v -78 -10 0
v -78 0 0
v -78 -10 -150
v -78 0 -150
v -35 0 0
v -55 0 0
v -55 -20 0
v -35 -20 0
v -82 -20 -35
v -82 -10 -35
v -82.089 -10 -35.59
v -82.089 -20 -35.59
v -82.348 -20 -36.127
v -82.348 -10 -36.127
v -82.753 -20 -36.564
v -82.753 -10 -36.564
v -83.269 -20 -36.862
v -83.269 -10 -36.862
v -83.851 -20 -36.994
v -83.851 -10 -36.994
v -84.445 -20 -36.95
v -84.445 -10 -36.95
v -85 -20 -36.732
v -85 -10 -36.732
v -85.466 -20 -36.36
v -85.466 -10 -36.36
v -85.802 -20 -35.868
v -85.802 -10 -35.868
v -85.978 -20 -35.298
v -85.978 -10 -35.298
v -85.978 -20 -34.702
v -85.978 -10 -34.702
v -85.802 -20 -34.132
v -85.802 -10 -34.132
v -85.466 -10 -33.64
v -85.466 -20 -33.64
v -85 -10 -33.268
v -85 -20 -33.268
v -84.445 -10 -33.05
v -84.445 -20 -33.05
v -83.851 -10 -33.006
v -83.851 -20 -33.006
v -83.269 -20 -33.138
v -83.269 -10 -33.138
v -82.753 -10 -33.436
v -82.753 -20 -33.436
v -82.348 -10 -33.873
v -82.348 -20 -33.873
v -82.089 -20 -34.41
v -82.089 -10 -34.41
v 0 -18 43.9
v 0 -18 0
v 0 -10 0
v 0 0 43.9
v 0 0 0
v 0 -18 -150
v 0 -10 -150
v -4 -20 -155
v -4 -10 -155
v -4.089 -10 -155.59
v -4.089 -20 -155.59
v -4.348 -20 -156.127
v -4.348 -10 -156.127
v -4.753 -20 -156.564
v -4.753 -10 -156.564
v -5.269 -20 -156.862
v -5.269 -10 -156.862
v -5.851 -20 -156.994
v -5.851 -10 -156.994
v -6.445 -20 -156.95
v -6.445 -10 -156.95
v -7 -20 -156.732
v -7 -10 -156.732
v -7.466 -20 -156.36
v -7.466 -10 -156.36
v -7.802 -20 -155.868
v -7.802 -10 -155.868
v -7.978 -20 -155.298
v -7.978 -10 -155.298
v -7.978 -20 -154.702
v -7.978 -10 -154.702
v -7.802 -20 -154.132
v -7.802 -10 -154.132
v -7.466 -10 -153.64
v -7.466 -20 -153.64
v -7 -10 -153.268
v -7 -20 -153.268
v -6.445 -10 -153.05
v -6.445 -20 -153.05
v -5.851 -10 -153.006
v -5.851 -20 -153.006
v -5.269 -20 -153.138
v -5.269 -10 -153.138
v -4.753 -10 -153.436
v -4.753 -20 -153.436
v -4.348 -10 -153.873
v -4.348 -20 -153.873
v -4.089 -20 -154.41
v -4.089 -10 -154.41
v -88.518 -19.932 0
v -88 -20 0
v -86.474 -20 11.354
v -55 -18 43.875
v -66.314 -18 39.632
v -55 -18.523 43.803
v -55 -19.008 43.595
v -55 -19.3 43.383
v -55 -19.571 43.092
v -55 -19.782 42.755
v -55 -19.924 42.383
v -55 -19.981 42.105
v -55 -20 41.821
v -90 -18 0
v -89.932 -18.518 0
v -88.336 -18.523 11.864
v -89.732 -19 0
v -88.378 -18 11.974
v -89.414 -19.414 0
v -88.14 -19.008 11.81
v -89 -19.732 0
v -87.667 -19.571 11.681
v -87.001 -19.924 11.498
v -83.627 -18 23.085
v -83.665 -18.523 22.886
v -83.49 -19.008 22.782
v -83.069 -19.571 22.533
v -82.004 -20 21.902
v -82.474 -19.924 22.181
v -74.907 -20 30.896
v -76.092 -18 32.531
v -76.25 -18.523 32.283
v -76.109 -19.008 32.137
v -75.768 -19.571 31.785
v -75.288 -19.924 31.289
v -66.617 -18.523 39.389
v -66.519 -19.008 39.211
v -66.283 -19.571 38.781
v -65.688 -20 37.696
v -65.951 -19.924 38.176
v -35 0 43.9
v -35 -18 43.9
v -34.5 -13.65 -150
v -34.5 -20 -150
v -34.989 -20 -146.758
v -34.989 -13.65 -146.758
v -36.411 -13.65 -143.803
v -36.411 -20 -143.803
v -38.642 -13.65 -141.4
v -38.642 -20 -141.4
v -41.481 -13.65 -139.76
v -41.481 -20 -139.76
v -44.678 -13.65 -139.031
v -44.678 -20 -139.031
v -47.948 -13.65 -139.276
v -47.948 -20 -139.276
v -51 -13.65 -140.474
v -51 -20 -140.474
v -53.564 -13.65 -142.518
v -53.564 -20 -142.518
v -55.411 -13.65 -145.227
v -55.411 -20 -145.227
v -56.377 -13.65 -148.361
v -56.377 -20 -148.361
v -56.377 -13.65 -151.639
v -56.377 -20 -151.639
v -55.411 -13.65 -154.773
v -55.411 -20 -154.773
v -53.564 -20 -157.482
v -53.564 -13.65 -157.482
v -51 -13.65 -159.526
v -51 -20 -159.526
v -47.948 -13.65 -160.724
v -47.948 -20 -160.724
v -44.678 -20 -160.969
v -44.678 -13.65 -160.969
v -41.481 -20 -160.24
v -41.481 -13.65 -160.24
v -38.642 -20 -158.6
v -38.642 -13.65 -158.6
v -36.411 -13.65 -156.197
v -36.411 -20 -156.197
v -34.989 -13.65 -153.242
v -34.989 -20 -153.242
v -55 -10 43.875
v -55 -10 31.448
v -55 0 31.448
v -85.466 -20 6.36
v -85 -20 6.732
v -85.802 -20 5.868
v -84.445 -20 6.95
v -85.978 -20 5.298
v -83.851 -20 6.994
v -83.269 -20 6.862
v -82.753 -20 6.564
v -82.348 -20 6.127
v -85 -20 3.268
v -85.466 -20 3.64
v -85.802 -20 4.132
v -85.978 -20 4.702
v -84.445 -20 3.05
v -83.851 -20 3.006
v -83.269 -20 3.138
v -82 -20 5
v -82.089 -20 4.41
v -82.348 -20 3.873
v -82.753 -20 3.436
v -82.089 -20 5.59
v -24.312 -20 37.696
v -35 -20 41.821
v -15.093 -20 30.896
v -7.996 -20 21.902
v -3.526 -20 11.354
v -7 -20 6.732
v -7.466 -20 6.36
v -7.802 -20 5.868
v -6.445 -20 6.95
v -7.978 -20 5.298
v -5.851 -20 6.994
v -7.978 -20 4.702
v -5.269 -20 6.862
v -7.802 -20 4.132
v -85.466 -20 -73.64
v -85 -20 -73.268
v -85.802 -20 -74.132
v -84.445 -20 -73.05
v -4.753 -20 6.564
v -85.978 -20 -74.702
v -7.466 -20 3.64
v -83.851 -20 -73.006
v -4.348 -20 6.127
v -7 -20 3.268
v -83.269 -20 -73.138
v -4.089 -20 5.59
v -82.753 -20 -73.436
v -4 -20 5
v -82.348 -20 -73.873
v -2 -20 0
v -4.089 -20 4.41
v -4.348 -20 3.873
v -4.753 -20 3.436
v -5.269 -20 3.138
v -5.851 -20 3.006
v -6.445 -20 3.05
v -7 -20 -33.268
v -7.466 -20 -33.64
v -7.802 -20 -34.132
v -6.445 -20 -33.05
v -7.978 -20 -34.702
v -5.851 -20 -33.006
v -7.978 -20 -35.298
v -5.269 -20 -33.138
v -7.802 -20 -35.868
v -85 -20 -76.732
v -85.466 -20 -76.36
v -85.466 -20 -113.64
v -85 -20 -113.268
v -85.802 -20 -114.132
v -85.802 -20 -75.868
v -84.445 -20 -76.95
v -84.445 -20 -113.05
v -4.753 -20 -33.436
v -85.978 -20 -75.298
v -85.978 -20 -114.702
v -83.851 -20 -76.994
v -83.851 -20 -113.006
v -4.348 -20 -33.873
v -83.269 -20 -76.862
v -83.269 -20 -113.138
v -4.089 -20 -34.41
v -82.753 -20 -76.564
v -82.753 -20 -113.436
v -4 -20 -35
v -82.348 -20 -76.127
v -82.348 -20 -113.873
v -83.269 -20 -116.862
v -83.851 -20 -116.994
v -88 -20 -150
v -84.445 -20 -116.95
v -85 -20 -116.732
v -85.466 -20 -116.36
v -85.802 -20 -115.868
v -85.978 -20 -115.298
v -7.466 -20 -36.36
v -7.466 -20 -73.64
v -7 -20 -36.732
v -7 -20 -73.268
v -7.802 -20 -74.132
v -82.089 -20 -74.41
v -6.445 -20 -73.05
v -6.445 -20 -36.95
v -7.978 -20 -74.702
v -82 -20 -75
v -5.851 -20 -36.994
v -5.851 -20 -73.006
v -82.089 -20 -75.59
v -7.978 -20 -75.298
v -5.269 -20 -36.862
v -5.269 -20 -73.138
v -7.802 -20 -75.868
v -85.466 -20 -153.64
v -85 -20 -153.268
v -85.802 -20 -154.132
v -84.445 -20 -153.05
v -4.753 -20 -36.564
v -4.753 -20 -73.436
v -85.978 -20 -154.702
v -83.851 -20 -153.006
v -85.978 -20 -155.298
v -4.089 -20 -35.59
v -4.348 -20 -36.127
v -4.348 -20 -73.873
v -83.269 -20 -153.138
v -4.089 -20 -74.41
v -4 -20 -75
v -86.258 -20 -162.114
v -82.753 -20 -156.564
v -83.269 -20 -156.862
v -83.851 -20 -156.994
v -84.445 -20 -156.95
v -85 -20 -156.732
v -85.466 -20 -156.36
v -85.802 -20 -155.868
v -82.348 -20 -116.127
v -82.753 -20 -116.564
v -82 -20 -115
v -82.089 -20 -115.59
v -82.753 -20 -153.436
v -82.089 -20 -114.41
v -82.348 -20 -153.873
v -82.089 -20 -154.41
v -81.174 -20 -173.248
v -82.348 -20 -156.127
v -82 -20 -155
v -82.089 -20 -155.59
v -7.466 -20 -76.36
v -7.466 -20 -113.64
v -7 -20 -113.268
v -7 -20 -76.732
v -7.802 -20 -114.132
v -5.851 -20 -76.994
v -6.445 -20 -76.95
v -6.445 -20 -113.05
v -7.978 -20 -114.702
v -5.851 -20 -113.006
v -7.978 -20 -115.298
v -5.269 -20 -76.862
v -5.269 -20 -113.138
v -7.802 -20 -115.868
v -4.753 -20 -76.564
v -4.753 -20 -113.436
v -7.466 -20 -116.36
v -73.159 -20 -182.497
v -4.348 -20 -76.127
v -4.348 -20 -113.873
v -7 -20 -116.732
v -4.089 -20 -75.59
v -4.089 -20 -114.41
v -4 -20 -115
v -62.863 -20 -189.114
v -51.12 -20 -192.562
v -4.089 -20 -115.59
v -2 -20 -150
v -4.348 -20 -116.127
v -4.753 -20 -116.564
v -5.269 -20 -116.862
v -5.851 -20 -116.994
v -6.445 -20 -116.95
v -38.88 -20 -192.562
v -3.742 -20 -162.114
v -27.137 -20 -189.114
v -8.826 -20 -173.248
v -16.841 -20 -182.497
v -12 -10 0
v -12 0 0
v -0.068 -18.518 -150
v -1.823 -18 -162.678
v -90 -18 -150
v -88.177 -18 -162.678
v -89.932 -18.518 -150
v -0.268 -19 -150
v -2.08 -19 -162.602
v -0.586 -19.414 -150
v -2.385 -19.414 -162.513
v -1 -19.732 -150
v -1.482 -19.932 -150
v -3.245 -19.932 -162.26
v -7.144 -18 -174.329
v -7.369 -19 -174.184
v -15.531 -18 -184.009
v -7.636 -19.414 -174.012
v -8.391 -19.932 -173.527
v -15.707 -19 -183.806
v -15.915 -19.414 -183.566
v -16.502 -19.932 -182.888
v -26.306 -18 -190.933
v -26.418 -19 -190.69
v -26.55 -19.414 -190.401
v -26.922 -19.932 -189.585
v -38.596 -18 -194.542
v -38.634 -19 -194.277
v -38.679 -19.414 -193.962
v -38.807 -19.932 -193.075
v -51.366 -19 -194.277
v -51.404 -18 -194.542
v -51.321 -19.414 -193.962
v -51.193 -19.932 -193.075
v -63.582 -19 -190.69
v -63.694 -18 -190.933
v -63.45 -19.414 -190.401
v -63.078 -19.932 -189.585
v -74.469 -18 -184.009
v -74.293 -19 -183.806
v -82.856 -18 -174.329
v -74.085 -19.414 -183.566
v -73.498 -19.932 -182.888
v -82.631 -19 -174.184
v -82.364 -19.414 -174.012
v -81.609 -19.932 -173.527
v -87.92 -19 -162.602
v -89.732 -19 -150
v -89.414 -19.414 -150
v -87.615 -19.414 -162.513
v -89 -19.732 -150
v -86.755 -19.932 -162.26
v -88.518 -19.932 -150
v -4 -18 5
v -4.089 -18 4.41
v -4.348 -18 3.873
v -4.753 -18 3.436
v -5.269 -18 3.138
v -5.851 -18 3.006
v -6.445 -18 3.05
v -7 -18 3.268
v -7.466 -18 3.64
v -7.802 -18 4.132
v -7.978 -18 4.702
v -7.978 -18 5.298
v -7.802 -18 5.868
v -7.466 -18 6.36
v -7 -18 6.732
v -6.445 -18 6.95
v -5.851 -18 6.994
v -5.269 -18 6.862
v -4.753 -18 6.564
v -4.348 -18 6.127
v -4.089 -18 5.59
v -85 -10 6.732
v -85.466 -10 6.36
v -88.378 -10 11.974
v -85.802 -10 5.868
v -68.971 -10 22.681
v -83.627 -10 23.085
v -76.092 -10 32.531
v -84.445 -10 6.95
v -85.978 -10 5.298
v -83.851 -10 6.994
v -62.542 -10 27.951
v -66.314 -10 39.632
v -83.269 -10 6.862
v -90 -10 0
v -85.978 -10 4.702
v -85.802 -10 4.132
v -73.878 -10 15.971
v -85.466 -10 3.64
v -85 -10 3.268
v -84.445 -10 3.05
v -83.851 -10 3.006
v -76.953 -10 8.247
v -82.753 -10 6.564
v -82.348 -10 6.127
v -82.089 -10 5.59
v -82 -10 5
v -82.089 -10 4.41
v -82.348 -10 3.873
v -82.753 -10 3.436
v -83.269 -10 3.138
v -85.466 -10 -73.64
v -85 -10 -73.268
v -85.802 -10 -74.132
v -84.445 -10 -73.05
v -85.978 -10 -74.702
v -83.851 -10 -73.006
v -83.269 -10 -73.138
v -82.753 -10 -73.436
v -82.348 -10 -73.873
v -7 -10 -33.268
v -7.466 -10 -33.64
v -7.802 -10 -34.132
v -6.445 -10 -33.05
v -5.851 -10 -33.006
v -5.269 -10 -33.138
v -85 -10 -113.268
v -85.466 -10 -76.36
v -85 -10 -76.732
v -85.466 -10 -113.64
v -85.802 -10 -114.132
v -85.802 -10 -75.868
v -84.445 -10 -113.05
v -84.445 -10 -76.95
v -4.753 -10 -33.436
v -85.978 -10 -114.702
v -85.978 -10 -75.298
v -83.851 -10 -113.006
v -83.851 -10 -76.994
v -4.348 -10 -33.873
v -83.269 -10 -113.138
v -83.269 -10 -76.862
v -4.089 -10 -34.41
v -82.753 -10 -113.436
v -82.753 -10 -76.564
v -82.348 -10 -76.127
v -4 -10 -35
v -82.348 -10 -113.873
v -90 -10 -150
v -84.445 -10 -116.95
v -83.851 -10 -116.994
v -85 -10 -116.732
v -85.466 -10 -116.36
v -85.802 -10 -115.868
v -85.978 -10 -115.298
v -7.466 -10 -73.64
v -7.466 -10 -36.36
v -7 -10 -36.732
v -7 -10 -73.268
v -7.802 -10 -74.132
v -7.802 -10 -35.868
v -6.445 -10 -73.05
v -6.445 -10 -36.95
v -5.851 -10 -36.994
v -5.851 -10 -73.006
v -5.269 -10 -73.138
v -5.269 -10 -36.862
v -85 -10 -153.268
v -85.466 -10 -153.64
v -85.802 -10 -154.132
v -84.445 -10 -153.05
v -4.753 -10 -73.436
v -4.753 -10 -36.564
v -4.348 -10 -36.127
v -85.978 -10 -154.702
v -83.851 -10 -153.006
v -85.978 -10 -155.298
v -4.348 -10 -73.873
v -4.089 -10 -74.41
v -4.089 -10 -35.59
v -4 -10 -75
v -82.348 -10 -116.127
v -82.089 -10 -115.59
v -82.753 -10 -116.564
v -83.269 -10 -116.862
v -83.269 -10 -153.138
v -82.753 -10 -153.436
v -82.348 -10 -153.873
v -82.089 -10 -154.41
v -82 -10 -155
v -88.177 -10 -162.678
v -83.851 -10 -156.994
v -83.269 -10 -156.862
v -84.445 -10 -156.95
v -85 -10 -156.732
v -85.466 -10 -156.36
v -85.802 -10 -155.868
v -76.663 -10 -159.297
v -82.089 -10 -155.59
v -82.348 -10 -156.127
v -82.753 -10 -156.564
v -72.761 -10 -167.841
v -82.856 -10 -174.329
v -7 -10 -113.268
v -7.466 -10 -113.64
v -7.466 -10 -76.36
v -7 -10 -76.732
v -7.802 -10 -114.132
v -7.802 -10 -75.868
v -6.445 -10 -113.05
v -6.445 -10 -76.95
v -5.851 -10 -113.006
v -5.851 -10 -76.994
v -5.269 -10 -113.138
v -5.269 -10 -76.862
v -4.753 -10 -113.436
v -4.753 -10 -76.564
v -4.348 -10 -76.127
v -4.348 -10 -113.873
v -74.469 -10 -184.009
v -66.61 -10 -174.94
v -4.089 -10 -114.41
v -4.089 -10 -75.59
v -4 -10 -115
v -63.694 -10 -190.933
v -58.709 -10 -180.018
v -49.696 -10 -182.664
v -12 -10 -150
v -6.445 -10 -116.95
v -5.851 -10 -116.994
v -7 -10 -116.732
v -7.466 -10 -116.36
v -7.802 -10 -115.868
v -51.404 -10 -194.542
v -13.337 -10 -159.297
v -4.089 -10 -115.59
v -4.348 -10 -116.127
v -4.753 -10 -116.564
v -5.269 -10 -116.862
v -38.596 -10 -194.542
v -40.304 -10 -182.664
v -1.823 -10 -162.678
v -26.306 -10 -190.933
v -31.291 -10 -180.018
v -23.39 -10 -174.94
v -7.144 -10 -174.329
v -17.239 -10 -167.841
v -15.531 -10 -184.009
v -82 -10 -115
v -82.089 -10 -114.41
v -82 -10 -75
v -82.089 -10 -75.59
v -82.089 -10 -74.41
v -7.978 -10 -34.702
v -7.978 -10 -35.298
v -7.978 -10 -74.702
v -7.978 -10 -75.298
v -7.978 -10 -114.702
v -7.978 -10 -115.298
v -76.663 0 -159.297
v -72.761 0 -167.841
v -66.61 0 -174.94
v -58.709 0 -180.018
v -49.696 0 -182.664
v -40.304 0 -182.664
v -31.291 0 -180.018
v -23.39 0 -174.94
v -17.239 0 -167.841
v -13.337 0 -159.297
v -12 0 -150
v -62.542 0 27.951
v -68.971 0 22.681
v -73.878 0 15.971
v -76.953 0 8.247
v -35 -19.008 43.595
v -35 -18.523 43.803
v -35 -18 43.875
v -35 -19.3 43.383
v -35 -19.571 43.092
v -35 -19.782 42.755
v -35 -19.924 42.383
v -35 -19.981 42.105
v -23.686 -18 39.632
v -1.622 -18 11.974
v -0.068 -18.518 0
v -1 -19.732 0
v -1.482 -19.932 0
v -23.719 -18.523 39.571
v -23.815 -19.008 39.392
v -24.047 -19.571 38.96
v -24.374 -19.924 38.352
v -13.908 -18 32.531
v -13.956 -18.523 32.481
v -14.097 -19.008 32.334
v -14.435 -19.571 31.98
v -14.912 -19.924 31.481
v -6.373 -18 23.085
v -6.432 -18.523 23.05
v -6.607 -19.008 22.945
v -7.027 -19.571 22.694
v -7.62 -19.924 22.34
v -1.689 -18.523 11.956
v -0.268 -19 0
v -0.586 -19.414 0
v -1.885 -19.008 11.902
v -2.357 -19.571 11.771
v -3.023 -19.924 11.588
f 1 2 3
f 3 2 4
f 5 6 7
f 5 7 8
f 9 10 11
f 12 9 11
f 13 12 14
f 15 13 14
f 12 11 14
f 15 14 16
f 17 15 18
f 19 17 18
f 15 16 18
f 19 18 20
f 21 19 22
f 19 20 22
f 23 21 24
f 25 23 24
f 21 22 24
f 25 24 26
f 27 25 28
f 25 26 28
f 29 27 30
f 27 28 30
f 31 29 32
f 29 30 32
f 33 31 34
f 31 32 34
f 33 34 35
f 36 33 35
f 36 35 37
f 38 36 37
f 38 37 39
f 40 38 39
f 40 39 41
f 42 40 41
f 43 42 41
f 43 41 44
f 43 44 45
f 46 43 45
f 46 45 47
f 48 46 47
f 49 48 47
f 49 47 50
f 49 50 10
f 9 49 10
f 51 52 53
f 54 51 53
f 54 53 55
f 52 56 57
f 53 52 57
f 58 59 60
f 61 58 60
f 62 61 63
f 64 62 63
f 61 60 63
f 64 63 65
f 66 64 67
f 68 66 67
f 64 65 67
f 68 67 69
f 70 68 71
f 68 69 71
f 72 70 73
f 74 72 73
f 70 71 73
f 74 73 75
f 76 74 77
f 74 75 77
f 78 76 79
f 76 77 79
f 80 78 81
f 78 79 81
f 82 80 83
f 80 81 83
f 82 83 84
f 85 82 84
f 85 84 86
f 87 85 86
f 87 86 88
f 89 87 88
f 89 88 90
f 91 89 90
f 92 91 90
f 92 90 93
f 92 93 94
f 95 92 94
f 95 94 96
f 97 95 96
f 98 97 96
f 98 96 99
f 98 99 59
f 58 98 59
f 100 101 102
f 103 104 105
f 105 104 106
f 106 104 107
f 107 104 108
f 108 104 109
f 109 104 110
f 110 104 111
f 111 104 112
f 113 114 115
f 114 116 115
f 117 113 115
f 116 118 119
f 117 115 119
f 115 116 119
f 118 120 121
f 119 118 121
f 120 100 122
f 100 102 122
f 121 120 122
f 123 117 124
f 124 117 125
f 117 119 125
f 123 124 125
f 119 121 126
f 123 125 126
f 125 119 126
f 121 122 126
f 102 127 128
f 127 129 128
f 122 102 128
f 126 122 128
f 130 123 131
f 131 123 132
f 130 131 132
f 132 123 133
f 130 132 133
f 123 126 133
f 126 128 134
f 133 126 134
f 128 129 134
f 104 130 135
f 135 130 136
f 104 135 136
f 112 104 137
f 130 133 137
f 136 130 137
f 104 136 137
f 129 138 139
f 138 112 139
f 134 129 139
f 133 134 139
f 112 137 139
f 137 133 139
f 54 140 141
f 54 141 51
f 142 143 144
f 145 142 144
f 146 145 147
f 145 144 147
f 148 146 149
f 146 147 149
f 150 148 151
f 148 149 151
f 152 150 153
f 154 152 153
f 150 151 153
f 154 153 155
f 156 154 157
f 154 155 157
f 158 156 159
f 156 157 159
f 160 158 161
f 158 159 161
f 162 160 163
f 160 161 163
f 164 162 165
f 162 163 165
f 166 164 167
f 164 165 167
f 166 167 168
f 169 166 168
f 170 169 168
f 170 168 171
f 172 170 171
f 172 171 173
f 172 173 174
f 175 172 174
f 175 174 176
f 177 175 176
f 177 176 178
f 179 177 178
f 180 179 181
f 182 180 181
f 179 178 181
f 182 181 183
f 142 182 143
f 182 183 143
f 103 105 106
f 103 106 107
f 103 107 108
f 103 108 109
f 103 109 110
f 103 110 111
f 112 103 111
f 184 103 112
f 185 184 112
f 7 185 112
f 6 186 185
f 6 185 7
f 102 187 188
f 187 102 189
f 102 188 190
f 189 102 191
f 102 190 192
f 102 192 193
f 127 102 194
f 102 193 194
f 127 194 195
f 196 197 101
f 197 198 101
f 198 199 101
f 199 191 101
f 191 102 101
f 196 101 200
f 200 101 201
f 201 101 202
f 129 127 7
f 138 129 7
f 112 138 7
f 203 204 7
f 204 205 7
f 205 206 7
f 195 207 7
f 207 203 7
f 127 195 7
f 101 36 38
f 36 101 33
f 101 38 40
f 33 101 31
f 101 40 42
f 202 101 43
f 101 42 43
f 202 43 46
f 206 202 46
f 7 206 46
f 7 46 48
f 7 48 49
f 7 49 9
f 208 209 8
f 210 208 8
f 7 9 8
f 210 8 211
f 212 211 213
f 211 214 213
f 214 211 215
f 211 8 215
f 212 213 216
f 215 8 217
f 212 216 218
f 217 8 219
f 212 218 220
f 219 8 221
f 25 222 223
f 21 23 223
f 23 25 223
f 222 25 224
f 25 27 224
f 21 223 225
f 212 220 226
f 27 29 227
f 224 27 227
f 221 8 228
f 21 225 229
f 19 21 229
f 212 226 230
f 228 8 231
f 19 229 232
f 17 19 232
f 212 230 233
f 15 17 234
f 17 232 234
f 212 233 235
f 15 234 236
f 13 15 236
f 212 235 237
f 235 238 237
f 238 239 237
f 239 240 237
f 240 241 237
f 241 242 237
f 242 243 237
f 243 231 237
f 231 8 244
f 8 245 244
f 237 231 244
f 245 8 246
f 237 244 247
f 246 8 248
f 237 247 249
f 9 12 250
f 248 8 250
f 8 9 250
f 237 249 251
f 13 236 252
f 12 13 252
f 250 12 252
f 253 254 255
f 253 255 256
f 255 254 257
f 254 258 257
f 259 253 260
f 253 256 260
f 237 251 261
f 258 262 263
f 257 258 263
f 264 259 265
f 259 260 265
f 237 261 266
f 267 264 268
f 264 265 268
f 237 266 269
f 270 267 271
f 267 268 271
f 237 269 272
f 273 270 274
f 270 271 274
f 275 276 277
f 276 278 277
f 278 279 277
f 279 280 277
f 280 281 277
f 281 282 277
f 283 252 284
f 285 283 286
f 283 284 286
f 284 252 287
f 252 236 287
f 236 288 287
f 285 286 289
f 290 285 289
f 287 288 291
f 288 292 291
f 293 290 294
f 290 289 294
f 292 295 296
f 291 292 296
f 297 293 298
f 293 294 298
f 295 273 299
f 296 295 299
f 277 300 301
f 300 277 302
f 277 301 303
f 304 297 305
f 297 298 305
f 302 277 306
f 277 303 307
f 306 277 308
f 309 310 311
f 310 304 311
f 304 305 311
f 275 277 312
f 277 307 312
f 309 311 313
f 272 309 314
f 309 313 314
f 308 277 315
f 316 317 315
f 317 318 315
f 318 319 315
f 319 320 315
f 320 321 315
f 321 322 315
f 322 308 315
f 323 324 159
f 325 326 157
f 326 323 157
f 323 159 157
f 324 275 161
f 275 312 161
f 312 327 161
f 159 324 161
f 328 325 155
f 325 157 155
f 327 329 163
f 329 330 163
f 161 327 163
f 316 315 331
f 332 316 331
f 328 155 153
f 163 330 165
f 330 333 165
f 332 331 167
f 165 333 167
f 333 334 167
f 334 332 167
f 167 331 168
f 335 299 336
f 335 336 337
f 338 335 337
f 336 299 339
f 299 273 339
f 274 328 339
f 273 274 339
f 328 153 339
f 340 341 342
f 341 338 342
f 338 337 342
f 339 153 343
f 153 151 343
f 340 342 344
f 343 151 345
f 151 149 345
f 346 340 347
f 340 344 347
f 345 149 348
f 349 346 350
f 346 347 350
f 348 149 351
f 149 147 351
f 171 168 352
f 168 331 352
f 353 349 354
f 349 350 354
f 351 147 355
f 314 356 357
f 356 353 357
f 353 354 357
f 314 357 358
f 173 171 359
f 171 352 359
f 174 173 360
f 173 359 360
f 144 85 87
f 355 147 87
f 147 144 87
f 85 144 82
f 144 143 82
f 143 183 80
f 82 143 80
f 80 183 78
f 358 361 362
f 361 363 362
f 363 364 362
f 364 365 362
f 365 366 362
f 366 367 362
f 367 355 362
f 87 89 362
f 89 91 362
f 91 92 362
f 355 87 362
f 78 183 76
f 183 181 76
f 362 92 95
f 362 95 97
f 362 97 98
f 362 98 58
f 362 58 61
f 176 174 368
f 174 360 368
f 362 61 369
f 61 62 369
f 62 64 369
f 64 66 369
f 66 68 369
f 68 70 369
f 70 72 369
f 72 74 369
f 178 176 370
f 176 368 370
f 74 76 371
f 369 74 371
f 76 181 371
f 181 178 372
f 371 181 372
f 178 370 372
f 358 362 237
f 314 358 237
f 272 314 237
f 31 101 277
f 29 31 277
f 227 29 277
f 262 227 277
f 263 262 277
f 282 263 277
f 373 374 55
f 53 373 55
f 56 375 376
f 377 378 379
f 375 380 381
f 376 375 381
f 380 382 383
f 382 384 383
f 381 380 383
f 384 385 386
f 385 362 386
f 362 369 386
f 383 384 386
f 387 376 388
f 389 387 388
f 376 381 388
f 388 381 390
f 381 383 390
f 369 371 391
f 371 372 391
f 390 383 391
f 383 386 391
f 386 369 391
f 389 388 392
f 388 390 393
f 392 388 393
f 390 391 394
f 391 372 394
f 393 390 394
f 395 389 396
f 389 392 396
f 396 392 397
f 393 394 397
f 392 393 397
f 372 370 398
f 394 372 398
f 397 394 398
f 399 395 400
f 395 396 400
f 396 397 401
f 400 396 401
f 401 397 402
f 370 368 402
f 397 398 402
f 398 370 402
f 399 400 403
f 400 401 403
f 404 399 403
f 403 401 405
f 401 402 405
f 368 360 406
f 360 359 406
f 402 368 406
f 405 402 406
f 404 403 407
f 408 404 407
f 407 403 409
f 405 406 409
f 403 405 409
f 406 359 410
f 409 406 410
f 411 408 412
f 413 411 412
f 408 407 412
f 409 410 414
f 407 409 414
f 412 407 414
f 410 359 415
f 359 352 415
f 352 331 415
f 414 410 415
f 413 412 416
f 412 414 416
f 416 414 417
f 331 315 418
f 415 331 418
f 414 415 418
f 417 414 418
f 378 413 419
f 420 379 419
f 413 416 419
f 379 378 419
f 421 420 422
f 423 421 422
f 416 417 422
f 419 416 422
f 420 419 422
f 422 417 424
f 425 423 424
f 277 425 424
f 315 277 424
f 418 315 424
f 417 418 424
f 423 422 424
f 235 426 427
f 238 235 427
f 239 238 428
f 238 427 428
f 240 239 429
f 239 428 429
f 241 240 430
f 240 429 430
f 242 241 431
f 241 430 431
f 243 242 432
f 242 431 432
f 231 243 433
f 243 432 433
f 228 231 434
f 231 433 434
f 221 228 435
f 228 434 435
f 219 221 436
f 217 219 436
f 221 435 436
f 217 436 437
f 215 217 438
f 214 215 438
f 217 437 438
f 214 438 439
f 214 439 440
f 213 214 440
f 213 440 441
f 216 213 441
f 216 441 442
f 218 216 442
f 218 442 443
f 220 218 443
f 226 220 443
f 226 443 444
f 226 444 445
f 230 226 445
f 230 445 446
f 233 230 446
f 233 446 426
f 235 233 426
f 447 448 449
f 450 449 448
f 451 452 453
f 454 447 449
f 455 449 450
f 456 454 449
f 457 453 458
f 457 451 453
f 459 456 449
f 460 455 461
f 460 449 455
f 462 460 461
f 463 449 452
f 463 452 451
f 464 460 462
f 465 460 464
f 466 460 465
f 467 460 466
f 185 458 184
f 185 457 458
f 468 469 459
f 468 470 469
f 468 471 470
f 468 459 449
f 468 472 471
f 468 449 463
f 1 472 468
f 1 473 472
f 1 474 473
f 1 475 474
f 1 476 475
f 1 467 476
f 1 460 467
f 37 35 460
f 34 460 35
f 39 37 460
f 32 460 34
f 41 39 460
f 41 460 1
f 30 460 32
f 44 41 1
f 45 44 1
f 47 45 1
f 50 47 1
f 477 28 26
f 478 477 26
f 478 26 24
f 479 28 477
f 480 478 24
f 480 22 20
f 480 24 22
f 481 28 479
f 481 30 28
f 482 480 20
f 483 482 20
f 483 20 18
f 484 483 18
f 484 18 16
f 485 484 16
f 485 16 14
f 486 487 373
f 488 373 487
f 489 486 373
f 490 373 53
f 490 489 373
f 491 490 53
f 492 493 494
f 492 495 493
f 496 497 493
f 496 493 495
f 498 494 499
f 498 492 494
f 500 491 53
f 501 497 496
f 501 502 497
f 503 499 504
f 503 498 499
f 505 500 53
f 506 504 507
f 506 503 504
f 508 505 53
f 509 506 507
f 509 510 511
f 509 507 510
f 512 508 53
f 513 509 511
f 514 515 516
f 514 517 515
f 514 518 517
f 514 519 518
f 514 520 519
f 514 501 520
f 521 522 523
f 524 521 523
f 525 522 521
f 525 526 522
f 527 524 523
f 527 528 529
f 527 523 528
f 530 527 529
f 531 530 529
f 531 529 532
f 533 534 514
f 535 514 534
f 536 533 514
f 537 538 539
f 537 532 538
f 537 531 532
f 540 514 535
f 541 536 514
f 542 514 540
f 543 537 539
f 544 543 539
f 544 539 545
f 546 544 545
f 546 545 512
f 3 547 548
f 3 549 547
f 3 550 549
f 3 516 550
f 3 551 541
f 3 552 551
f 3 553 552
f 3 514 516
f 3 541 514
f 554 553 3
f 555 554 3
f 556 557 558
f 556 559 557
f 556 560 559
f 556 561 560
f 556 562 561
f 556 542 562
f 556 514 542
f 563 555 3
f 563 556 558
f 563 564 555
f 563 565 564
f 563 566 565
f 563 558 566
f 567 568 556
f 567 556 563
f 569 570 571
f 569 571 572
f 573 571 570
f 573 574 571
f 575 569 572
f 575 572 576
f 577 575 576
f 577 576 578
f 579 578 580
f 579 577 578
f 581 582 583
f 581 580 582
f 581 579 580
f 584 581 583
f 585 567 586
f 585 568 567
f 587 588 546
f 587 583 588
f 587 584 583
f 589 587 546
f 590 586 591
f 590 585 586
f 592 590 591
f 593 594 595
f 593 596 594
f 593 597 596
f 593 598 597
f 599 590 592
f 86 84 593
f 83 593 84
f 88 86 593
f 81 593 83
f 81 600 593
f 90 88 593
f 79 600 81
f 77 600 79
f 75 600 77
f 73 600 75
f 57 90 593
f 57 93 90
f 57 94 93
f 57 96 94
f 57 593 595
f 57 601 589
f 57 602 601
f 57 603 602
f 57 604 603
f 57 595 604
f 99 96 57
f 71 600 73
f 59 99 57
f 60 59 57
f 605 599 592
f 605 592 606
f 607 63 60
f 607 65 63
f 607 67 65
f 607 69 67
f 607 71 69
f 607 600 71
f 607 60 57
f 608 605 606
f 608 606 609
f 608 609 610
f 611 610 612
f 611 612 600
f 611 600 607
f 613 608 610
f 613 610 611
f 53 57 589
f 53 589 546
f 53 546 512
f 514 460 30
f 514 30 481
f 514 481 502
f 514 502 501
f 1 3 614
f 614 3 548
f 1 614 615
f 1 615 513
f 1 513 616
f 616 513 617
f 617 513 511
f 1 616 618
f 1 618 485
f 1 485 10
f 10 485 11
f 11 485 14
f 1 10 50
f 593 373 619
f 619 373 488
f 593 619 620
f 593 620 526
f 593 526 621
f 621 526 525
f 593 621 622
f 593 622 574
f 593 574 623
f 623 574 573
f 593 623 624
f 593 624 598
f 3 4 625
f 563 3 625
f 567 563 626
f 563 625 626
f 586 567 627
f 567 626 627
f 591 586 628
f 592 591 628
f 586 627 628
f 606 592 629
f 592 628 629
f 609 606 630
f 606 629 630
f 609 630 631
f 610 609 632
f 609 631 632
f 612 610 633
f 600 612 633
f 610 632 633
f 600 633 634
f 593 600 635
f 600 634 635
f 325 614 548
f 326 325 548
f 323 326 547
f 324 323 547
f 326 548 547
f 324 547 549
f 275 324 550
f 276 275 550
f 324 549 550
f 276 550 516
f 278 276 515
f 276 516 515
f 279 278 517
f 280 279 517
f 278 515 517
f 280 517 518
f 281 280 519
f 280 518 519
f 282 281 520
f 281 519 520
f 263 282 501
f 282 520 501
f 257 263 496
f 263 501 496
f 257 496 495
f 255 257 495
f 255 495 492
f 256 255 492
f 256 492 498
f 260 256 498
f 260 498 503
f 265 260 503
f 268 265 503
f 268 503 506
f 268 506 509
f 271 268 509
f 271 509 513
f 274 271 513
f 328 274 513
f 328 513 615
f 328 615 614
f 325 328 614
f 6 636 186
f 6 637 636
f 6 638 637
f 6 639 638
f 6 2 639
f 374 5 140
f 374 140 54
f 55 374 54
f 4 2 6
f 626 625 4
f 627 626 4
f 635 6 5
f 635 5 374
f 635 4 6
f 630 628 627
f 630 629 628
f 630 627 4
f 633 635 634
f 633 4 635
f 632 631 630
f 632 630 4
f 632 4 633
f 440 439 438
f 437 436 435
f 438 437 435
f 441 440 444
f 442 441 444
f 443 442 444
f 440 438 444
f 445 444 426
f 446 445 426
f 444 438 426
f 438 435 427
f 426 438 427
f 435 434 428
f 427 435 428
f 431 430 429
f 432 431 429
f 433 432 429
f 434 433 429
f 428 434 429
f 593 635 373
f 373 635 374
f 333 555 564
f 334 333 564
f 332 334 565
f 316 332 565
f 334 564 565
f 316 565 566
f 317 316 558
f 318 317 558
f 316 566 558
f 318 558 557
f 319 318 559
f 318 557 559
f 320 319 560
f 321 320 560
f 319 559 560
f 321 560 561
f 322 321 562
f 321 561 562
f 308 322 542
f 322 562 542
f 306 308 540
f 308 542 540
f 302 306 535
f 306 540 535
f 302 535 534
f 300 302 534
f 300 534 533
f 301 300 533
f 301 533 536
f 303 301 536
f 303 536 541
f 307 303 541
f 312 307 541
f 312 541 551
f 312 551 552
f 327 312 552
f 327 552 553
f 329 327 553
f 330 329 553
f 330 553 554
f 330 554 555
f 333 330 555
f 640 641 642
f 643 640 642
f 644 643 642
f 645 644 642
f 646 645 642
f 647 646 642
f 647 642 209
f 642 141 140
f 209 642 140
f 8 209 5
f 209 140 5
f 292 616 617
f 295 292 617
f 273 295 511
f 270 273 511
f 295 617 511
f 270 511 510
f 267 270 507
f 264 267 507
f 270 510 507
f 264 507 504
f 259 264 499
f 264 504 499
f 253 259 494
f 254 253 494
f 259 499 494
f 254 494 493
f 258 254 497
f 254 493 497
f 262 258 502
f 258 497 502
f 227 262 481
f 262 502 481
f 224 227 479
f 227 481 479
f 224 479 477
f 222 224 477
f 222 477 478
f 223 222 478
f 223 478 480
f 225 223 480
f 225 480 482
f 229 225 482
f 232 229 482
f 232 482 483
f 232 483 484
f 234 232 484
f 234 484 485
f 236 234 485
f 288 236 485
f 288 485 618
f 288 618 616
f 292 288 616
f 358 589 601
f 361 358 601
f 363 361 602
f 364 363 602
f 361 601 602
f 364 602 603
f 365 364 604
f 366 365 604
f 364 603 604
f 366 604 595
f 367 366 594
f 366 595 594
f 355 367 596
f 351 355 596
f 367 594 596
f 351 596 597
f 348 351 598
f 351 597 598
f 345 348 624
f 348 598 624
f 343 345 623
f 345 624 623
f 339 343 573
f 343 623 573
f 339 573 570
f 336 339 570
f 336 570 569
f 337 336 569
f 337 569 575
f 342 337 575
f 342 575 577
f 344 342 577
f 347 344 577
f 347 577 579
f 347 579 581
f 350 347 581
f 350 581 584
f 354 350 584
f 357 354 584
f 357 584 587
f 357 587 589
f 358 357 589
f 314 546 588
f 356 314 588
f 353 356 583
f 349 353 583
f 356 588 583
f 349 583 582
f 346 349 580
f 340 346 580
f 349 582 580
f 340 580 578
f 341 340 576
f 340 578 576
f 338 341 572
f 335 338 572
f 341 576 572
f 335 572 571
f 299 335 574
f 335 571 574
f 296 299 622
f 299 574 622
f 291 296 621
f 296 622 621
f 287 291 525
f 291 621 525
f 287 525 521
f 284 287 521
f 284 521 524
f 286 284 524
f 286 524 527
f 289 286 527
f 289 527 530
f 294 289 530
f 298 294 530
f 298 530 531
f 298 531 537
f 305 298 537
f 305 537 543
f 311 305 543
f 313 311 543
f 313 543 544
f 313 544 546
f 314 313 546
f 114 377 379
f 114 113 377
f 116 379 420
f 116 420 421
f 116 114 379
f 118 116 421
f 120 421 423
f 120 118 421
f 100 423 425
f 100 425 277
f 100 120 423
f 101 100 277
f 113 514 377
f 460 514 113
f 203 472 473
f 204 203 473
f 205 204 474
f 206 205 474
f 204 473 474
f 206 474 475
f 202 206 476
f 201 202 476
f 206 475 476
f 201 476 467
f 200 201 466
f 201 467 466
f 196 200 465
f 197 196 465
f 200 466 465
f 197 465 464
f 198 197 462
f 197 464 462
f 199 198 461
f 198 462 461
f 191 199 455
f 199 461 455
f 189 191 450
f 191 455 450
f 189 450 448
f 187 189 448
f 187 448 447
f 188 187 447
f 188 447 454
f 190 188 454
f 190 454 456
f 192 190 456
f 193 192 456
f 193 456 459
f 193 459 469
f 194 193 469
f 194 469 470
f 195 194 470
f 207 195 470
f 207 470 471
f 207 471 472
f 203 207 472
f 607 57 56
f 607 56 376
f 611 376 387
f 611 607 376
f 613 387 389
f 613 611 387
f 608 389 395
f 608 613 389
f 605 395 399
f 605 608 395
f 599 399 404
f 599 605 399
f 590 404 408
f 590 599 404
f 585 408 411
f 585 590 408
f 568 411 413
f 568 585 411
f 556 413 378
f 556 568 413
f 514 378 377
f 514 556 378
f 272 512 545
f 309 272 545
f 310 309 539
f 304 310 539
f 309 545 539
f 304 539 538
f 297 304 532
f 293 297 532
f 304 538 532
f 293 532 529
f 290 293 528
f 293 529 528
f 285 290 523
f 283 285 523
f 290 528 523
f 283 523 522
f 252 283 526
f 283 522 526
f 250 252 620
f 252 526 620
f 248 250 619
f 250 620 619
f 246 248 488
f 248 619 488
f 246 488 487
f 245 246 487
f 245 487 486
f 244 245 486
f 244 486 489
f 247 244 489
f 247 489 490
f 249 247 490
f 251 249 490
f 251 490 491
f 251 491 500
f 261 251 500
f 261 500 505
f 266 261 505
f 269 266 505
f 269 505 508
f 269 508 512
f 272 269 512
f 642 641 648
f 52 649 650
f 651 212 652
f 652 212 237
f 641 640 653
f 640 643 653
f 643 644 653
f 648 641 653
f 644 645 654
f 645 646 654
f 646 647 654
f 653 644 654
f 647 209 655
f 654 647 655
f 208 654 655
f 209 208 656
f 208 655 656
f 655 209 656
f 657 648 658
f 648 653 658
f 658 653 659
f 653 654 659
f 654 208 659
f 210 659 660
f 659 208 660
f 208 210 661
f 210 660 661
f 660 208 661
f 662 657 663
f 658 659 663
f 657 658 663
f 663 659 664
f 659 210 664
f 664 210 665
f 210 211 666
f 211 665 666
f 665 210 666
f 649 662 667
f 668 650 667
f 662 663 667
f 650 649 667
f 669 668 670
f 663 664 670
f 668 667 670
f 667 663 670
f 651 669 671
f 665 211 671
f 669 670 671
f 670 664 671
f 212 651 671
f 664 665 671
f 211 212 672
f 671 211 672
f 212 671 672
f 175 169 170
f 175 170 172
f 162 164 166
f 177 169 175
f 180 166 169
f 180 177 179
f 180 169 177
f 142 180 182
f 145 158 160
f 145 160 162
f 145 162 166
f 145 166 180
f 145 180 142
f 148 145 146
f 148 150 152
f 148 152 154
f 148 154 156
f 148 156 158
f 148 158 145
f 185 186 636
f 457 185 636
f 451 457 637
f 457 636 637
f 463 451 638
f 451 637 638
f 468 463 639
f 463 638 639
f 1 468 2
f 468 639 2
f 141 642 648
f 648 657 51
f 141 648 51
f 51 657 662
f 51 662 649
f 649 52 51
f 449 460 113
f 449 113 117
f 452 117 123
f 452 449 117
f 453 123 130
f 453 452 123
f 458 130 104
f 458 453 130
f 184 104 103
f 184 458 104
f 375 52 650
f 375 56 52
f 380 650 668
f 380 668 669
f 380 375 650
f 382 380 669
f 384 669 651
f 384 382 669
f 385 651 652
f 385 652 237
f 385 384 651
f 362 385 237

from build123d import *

# Parameters (mm, degrees)
BOSS_EXTRUDE1_DEPTH = 20
FILLET1_R           = 2
SKETCH4_R           = 11
CUT_EXTRUDE2_DEPTH  = 6.35
SKETCH5_OUTSIDE_W   = 143.42
SKETCH5_OUTSIDE_H   = 293.42
CUT_EXTRUDE3_DEPTH  = 10
SKETCH7_R           = 2
CUT_EXTRUDE4_DEPTH  = 11
SKETCH9_W           = 20
SKETCH9_H           = 50.969748303
CUT_EXTRUDE6_DEPTH  = 21
SKETCH10_W          = 35
SKETCH10_H          = 18
BOSS_EXTRUDE2_DEPTH = 43.9


with BuildPart() as part:
    # Sketch1 → Boss-Extrude1 (new body)
    with BuildSketch(Plane(origin=(0, 0, 0), x_dir=(1, 0, 0), z_dir=(0, 1, 0))):
        with BuildLine():
            Line((0, 0), (0, 150))
            ThreePointArc((0, 150), (-45, 195), (-90, 150))
            Line((-90, 150), (-90, 0))
            ThreePointArc((-90, 0), (-45, -45), (0, 0))
        make_face()
    extrude(amount=-BOSS_EXTRUDE1_DEPTH)

    # Fillet1
    fillet1_edges = [part.edges().sort_by_distance(p)[0] for p in [
        (-45, -20, -195),
        (-90, -20, -75),
        (-45, -20, 45),
        (-90, 0, -75),
        (-45, 0, -195),
        (0, 0, -75),
        (-45, 0, 45),
        (0, -20, -75),
    ]]
    fillet(fillet1_edges, radius=FILLET1_R)

    # Sketch4 → Cut-Extrude2 (cut)
    with BuildSketch(Plane.XZ.offset(20)):
        with Locations((-45.5, -150)):
            Circle(SKETCH4_R)
    extrude(amount=-CUT_EXTRUDE2_DEPTH, mode=Mode.SUBTRACT)

    # Sketch5 outside → Cut-Extrude3 (cut)
    with BuildSketch(Plane(origin=(0, 0, 0), x_dir=(1, 0, 0), z_dir=(0, 1, 0))):
        with Locations((-45, 75)):
            Rectangle(SKETCH5_OUTSIDE_W, SKETCH5_OUTSIDE_H)
        with BuildLine():
            Line((-78, 0), (-78, 150))
            ThreePointArc((-78, 150), (-45, 183), (-12, 150))
            Line((-12, 150), (-12, 0))
            ThreePointArc((-12, 0), (-45, -33), (-78, 0))
        make_face(mode=Mode.SUBTRACT)
    extrude(amount=-CUT_EXTRUDE3_DEPTH, mode=Mode.SUBTRACT)

    # Sketch7 → Cut-Extrude4 (cut, through all)
    with BuildSketch(Plane(origin=(0, -10, 0), x_dir=(1, 0, 0), z_dir=(0, 1, 0))):
        with Locations((-6, 75)):
            Circle(SKETCH7_R)
        with Locations((-6, 115)):
            Circle(SKETCH7_R)
        with Locations((-6, 155)):
            Circle(SKETCH7_R)
        with Locations((-6, 35)):
            Circle(SKETCH7_R)
        with Locations((-6, -5)):
            Circle(SKETCH7_R)
        with Locations((-84, -5)):
            Circle(SKETCH7_R)
        with Locations((-84, 35)):
            Circle(SKETCH7_R)
        with Locations((-84, 75)):
            Circle(SKETCH7_R)
        with Locations((-84, 115)):
            Circle(SKETCH7_R)
        with Locations((-84, 155)):
            Circle(SKETCH7_R)
    extrude(amount=-CUT_EXTRUDE4_DEPTH, mode=Mode.SUBTRACT)

    # Sketch9 → Cut-Extrude6 (cut, through all)
    with BuildSketch(Plane(origin=(0, 0, 0), x_dir=(1, 0, 0), z_dir=(0, 1, 0))):
        with Locations((-45, -25.484874152)):
            Rectangle(SKETCH9_W, SKETCH9_H)
    extrude(amount=-CUT_EXTRUDE6_DEPTH, mode=Mode.SUBTRACT)

    # Sketch10 → Boss-Extrude2 (add)
    with BuildSketch(Plane.XY):
        with Locations((-17.5, -9)):
            Rectangle(SKETCH10_W, SKETCH10_H)
    extrude(amount=BOSS_EXTRUDE2_DEPTH)


solid = part.part
